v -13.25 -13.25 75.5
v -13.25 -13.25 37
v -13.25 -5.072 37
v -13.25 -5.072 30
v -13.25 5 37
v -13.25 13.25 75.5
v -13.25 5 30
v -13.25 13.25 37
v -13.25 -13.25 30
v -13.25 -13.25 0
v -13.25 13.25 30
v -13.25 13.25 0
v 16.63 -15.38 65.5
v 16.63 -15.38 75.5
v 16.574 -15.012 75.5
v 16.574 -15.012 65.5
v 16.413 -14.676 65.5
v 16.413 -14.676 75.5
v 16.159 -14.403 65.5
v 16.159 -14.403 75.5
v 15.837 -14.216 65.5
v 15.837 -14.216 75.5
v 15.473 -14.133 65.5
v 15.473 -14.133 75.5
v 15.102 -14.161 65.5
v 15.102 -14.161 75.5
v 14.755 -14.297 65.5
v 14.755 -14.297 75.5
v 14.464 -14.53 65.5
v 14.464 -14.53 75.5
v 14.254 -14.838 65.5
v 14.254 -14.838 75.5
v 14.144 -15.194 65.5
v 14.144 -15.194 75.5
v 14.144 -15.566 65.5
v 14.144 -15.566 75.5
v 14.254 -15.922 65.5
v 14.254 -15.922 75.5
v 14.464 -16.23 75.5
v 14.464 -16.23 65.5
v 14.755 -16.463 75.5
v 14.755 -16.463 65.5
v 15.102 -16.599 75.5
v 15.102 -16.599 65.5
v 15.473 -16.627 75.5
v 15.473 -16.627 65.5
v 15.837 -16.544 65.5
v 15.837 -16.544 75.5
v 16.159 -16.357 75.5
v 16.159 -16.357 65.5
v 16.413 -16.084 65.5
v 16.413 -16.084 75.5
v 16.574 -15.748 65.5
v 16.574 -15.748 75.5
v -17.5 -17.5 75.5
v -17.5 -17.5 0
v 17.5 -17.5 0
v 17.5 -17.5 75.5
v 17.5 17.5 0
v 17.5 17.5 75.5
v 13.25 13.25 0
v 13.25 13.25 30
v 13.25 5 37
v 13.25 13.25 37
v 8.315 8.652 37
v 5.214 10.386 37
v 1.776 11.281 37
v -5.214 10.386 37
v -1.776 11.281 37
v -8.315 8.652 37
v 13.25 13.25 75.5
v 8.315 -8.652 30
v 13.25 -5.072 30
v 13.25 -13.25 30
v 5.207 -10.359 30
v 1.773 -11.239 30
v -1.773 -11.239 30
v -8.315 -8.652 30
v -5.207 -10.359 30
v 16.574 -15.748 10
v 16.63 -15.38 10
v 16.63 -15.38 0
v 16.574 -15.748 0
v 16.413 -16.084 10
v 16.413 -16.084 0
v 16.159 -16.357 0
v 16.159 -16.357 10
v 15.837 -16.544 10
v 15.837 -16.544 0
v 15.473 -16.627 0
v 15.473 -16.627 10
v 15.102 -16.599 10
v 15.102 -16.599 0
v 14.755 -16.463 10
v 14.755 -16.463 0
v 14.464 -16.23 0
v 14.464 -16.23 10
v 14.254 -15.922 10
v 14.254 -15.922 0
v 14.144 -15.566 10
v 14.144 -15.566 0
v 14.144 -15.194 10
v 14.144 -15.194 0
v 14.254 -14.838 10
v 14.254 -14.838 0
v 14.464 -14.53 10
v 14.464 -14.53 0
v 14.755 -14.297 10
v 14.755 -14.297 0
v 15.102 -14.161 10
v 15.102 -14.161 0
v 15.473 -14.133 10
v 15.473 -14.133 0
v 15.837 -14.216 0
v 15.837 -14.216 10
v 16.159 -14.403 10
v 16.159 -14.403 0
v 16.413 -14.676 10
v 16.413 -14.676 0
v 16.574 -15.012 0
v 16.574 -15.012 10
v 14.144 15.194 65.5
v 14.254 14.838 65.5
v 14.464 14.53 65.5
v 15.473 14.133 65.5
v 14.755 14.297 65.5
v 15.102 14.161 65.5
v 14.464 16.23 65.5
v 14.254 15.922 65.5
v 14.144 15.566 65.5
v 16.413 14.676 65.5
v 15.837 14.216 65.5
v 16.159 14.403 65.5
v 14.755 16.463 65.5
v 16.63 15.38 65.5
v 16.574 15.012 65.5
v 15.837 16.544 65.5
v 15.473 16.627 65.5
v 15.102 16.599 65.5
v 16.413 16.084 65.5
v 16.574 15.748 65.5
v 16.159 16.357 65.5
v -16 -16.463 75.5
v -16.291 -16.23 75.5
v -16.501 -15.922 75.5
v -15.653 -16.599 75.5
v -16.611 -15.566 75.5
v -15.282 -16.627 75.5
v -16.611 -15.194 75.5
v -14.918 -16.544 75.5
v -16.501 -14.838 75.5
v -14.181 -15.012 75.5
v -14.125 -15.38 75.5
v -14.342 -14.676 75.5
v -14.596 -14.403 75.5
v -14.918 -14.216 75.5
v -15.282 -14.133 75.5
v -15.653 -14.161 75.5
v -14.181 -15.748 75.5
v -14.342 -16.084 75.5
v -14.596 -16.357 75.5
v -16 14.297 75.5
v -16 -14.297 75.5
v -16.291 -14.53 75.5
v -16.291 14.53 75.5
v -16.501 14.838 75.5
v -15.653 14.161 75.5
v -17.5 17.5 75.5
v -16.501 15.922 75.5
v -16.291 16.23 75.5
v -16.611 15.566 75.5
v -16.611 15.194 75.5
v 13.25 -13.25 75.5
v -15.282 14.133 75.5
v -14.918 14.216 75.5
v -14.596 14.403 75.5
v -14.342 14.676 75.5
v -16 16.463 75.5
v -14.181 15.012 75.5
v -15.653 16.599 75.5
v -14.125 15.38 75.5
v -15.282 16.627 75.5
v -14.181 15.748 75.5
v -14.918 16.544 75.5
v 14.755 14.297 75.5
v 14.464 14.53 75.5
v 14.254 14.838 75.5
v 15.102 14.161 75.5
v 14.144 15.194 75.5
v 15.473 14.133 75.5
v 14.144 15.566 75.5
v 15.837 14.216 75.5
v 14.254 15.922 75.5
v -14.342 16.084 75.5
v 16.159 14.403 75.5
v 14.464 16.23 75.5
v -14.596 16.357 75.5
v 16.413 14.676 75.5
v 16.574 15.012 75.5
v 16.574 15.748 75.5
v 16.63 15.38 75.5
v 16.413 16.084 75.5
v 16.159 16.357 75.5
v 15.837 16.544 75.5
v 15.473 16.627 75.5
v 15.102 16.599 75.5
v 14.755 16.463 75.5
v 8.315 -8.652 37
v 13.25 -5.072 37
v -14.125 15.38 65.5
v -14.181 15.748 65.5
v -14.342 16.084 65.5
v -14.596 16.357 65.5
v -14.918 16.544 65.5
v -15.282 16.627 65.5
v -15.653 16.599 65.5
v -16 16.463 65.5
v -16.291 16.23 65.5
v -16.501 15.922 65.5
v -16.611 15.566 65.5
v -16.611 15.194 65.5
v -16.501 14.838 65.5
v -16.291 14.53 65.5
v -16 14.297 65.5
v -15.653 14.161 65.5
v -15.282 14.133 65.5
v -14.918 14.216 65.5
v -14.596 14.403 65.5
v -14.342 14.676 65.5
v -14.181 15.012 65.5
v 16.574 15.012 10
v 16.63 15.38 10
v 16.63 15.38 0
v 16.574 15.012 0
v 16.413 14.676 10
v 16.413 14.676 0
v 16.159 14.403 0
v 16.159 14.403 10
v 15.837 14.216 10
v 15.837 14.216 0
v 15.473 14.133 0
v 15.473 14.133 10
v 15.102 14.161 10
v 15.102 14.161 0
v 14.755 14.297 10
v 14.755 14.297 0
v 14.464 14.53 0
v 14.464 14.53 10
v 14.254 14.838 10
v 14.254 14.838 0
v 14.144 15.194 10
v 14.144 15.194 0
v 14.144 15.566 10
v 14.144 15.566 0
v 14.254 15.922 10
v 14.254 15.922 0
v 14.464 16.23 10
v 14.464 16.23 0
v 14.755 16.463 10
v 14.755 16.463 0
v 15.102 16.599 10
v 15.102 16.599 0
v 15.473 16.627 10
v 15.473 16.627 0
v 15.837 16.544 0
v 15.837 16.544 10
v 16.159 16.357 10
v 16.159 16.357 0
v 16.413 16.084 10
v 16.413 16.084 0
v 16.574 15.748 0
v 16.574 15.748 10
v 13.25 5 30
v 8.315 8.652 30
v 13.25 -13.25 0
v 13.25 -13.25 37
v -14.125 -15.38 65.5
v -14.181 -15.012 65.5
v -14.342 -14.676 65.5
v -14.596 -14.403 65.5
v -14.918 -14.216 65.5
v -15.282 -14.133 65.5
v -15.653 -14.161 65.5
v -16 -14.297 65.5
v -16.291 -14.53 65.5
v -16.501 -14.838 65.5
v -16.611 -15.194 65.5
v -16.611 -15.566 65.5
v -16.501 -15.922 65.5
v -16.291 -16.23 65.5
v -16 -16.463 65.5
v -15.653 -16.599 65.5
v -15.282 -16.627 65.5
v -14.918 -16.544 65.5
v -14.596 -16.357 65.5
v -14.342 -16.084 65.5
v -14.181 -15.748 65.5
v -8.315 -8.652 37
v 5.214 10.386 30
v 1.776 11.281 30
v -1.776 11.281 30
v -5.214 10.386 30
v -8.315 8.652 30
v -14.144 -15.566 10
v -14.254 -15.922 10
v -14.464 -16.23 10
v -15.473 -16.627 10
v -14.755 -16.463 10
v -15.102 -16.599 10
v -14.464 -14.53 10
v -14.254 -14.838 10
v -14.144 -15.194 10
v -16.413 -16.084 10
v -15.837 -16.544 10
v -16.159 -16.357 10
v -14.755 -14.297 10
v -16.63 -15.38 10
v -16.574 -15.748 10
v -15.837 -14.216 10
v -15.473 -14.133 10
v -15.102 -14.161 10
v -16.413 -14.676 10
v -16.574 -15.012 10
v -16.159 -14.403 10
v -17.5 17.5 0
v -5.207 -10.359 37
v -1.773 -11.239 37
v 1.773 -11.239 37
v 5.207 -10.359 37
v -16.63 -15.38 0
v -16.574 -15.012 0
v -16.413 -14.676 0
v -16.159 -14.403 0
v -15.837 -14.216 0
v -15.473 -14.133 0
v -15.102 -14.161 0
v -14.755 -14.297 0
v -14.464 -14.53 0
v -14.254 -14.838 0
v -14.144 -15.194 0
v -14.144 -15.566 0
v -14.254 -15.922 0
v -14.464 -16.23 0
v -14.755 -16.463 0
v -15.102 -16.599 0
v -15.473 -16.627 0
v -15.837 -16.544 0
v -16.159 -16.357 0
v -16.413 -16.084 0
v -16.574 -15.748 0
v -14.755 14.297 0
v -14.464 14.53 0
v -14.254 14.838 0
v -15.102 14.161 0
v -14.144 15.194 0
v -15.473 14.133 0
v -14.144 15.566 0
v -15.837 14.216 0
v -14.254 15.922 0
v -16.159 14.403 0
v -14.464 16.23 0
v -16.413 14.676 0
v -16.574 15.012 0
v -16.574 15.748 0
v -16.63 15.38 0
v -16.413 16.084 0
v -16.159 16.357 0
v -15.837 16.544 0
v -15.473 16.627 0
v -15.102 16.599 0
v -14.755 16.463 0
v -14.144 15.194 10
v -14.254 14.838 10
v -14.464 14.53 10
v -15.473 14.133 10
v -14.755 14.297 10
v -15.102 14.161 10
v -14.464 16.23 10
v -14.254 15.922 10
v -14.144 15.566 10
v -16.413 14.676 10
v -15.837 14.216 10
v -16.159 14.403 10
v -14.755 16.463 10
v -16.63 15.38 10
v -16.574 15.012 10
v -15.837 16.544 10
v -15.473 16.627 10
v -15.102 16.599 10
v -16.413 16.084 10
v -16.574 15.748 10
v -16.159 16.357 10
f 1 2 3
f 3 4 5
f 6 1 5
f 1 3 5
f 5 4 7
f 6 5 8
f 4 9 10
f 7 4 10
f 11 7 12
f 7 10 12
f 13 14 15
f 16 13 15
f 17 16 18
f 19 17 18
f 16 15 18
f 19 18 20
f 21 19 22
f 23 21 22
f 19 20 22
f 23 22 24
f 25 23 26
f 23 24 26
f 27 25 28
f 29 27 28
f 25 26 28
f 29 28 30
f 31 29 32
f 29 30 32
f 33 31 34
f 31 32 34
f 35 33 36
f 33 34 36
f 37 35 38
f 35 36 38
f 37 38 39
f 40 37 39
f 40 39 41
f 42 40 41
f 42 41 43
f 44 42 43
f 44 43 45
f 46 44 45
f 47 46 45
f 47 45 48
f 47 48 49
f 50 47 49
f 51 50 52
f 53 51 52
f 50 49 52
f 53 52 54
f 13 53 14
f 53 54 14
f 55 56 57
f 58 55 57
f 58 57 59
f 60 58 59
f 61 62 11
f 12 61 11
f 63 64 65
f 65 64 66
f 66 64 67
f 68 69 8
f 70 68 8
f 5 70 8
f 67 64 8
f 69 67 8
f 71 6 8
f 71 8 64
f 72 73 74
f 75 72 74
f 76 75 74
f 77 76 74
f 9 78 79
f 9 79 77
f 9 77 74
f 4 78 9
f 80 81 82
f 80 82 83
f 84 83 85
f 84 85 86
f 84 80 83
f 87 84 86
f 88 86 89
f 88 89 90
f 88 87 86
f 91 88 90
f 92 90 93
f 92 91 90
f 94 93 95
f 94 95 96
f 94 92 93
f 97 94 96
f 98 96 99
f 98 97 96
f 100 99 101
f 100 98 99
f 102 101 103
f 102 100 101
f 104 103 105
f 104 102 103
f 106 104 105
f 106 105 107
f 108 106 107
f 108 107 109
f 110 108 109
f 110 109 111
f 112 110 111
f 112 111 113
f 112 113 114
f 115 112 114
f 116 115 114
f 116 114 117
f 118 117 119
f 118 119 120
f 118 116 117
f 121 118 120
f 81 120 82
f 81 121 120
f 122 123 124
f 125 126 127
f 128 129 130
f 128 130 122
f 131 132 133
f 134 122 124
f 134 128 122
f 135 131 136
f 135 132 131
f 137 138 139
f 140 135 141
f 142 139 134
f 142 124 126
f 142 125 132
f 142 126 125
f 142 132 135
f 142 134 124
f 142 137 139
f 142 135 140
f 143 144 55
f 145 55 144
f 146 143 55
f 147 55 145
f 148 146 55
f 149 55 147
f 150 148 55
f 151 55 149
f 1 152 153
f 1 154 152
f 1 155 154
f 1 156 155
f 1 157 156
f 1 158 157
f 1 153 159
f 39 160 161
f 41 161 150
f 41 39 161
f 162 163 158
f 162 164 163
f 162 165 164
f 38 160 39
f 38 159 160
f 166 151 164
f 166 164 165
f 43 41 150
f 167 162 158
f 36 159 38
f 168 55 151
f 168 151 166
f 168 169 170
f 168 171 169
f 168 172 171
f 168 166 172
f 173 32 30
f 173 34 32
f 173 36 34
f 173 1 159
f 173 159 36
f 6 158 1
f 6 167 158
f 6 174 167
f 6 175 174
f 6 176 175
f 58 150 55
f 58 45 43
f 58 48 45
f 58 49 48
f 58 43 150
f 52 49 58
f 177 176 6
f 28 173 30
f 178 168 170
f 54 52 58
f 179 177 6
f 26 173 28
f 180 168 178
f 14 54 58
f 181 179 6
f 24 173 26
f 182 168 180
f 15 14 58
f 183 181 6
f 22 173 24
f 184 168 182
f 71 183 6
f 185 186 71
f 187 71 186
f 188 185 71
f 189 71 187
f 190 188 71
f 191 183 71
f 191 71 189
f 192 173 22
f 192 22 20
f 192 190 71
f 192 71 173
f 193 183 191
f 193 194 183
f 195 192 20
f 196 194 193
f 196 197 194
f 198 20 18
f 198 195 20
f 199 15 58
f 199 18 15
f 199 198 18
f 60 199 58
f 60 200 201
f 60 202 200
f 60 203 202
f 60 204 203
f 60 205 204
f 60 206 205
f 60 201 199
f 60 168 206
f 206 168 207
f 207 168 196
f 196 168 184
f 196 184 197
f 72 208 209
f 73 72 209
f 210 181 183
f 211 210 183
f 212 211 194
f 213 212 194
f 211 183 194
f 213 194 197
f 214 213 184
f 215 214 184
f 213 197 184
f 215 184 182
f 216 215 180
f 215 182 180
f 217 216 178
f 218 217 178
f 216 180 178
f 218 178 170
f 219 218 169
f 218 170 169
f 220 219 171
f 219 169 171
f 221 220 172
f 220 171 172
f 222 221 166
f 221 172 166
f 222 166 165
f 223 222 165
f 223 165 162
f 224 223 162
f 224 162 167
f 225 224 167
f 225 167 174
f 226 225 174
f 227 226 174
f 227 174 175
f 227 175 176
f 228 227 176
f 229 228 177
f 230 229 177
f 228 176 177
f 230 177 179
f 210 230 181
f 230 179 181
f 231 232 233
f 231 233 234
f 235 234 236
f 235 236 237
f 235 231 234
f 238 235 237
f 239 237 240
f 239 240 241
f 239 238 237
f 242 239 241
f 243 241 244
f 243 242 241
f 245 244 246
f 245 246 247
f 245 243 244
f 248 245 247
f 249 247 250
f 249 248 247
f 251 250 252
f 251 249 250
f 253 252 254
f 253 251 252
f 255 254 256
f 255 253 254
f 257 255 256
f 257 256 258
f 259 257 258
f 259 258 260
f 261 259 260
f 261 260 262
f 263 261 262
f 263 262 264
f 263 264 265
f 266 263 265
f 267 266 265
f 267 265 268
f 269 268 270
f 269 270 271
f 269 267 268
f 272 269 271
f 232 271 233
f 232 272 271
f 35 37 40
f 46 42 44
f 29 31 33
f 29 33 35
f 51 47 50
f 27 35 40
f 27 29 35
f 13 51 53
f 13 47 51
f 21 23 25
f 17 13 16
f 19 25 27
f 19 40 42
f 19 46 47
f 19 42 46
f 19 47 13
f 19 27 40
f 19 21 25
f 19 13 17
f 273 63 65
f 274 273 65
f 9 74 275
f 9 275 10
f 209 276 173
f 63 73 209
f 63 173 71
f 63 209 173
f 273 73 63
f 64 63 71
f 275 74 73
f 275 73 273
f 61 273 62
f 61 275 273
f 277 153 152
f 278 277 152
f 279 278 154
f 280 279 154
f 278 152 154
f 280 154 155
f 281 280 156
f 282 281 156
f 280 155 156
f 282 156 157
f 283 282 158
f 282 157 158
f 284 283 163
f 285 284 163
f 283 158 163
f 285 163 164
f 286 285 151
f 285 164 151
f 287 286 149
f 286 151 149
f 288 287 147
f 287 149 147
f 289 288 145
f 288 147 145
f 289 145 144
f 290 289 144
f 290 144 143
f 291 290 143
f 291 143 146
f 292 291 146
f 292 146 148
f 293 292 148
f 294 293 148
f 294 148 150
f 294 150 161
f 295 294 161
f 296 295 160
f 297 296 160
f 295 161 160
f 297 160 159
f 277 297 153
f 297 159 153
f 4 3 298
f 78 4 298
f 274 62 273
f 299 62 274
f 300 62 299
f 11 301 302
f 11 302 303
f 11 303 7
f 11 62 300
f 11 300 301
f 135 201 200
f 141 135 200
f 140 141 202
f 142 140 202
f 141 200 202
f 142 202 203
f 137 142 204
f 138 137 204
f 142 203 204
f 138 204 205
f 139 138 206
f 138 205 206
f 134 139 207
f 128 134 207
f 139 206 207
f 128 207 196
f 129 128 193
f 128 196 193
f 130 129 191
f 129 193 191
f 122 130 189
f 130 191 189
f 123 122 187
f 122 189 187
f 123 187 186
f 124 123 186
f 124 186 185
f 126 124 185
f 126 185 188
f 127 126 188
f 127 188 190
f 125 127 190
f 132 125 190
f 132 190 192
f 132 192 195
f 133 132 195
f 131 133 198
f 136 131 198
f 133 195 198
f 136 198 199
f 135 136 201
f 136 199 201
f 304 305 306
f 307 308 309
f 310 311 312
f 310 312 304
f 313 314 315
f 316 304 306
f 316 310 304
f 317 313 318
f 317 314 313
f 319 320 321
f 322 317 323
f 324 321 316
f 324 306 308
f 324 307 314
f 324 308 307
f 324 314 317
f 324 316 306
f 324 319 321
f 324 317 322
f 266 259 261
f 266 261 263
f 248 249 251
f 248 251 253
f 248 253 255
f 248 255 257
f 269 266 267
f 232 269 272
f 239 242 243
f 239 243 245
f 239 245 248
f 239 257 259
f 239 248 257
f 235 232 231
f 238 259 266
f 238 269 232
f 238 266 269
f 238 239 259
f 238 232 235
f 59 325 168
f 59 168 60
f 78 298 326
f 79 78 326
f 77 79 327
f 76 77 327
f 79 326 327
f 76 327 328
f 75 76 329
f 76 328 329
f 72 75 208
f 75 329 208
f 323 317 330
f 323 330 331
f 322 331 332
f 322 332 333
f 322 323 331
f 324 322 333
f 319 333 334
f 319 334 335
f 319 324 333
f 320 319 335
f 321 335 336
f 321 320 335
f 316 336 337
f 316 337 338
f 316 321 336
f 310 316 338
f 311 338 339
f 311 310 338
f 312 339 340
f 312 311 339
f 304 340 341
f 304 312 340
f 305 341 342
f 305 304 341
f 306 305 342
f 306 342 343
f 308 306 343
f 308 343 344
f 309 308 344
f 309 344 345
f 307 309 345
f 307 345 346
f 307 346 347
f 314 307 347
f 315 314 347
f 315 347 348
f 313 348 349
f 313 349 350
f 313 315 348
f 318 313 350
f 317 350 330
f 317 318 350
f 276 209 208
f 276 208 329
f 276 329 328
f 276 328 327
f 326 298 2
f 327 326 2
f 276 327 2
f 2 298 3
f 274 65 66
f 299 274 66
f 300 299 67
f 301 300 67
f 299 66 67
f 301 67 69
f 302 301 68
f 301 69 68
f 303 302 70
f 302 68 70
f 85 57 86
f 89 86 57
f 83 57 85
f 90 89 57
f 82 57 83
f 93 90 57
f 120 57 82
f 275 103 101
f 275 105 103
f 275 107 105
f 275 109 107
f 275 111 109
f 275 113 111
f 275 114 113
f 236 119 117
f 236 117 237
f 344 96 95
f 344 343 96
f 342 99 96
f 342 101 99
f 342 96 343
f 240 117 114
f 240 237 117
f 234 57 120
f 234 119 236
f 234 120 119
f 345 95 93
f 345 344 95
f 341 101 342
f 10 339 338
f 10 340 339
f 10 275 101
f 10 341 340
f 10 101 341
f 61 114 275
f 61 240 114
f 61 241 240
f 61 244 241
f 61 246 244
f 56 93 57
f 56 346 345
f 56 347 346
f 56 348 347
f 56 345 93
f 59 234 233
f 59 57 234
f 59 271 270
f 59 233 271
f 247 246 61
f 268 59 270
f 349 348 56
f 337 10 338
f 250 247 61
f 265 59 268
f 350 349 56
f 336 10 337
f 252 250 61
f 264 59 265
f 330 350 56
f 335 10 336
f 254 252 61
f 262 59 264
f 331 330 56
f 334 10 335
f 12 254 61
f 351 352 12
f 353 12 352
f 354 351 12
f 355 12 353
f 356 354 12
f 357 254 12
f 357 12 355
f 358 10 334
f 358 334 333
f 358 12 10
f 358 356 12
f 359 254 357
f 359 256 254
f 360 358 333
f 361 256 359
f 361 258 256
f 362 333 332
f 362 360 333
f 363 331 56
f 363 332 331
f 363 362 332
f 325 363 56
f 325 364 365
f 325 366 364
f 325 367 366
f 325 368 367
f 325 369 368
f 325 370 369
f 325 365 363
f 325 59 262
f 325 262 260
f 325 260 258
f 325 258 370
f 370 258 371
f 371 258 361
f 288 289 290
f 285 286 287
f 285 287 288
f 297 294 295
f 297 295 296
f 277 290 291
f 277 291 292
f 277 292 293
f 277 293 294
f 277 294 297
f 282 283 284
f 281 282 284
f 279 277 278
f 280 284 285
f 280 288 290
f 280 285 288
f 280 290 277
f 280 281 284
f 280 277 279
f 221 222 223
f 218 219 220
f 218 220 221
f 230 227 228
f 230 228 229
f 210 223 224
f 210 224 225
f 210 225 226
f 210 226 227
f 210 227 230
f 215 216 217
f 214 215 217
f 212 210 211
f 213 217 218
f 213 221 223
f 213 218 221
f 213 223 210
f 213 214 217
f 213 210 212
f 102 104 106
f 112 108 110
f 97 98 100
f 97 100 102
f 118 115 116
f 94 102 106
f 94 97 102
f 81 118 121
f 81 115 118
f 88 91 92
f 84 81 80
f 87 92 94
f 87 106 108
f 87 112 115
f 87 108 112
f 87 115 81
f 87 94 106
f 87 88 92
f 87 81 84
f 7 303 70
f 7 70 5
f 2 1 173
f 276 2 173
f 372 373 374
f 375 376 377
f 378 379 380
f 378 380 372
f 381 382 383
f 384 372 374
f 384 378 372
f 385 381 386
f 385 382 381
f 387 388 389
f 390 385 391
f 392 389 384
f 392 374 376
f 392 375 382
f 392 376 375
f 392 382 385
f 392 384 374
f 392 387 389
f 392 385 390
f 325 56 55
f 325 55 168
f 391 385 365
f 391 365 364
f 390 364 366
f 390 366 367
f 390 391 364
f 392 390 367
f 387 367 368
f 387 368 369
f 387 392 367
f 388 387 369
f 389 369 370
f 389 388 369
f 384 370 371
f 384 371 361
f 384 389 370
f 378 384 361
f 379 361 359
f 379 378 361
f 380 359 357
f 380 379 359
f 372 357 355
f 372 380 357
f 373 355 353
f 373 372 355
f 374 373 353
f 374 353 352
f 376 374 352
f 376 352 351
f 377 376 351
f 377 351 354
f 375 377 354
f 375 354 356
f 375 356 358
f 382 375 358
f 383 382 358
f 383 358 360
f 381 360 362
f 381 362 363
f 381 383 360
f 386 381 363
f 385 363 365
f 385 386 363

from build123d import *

# Parameters (mm, degrees)
CROQUIS1_W              = 35
CROQUIS1_H              = 35
SALIENTE_EXTRUIR2_DEPTH = 75.5
CROQUIS2_W              = 26.5
CROQUIS2_H              = 26.5
CORTAR_EXTRUIR1_DEPTH   = 80
CROQUIS4_R              = 1.25
CORTAR_EXTRUIR2_DEPTH   = 10
CORTAR_EXTRUIR5_START   = -10
CROQUIS9_R              = 1.25
CORTAR_EXTRUIR5_DEPTH   = 10
CROQUIS11_W             = 26.5
CROQUIS11_H             = 26.5
SALIENTE_EXTRUIR3_DEPTH = 37
CROQUIS13_W             = 26.5
CROQUIS13_H             = 26.5
CORTAR_EXTRUIR6_DEPTH   = 30
CORTAR_EXTRUIR7_REACH   = 47.768


with BuildPart() as part:
    # Croquis1 → Saliente-Extruir2 (new body)
    with BuildSketch(Plane.XY):
        Rectangle(CROQUIS1_W, CROQUIS1_H)
    extrude(amount=SALIENTE_EXTRUIR2_DEPTH)

    # Croquis2 → Cortar-Extruir1 (cut)
    with BuildSketch(Plane.XY.offset(75.5)):
        Rectangle(CROQUIS2_W, CROQUIS2_H)
    extrude(amount=-CORTAR_EXTRUIR1_DEPTH, mode=Mode.SUBTRACT)

    # Croquis4 → Cortar-Extruir2 (cut)
    with BuildSketch(Plane.XY.offset(75.5)):
        with Locations((-15.375, 15.38)):
            Circle(CROQUIS4_R)
        with Locations((15.38, 15.38)):
            Circle(CROQUIS4_R)
        with Locations((15.38, -15.38)):
            Circle(CROQUIS4_R)
        with Locations((-15.375, -15.38)):
            Circle(CROQUIS4_R)
    extrude(amount=-CORTAR_EXTRUIR2_DEPTH, mode=Mode.SUBTRACT)

    # Croquis9 → Cortar-Extruir5 (cut)
    with BuildSketch(Plane(origin=(0, 0, 0), x_dir=(-1, 0, 0), z_dir=(0, 0, -1)).offset(CORTAR_EXTRUIR5_START)):
        with Locations(Location((-15.38, 15.38, 0), (0, 0, 180))):
            Circle(CROQUIS9_R)
        with Locations((15.38, 15.38)):
            Circle(CROQUIS9_R)
        with Locations((15.38, -15.38)):
            Circle(CROQUIS9_R)
        with Locations(Location((-15.38, -15.38, 0), (0, 0, 180))):
            Circle(CROQUIS9_R)
    extrude(amount=CORTAR_EXTRUIR5_DEPTH, mode=Mode.SUBTRACT)

    # Croquis11 → Saliente-Extruir3 (add)
    with BuildSketch(Plane(origin=(0, 0, 0), x_dir=(-1, 0, 0), z_dir=(0, 0, -1))):
        Rectangle(CROQUIS11_W, CROQUIS11_H)
    extrude(amount=-SALIENTE_EXTRUIR3_DEPTH)

    # Croquis13 → Cortar-Extruir6 (cut)
    with BuildSketch(Plane(origin=(0, 0, 0), x_dir=(-1, 0, 0), z_dir=(0, 0, -1))):
        Rectangle(CROQUIS13_W, CROQUIS13_H)
    extrude(amount=-CORTAR_EXTRUIR6_DEPTH, mode=Mode.SUBTRACT)

    # Croquis14 → Cortar-Extruir7 (cut, up to next)
    with BuildSketch(Plane.XY.offset(37), mode=Mode.PRIVATE) as cortar_extruir7_sk1:
        with BuildLine():
            Line((13.25, -5.072292803), (13.25, 0))
            Line((13.25, 0), (-13.25, 0))
            Line((-13.25, 0), (-13.25, -5.072292803))
            Line((-13.25, -5.072292803), (-8.314710179, -8.652490661))
            ThreePointArc((-8.314710179, -8.652490661), (0, -11.350749828), (8.314710179, -8.652490661))
            Line((8.314710179, -8.652490661), (13.25, -5.072292803))
        make_face()
    cortar_extruir7_tool1 = extrude(cortar_extruir7_sk1.sketch, amount=-CORTAR_EXTRUIR7_REACH, mode=Mode.PRIVATE) & part.part
    # Croquis14 → Cortar-Extruir7 (cut, up to next)
    with BuildSketch(Plane.XY.offset(37), mode=Mode.PRIVATE) as cortar_extruir7_sk2:
        with BuildLine():
            Line((-13.25, 0), (13.25, 0))
            Line((13.25, 0), (13.25, 4.999749994))
            Line((13.25, 4.999749994), (8.314710179, 8.652490661))
            ThreePointArc((8.314710179, 8.652490661), (0, 11.394764723), (-8.314710179, 8.652490661))
            Line((-8.314710179, 8.652490661), (-13.25, 4.999749994))
            Line((-13.25, 4.999749994), (-13.25, 0))
        make_face()
    cortar_extruir7_tool2 = extrude(cortar_extruir7_sk2.sketch, amount=-CORTAR_EXTRUIR7_REACH, mode=Mode.PRIVATE) & part.part
    add(cortar_extruir7_tool1.solids().sort_by_distance((0, -4.780438, 37))[0], mode=Mode.SUBTRACT)
    add(cortar_extruir7_tool2.solids().sort_by_distance((0, 4.791209, 37))[0], mode=Mode.SUBTRACT)


solid = part.part
